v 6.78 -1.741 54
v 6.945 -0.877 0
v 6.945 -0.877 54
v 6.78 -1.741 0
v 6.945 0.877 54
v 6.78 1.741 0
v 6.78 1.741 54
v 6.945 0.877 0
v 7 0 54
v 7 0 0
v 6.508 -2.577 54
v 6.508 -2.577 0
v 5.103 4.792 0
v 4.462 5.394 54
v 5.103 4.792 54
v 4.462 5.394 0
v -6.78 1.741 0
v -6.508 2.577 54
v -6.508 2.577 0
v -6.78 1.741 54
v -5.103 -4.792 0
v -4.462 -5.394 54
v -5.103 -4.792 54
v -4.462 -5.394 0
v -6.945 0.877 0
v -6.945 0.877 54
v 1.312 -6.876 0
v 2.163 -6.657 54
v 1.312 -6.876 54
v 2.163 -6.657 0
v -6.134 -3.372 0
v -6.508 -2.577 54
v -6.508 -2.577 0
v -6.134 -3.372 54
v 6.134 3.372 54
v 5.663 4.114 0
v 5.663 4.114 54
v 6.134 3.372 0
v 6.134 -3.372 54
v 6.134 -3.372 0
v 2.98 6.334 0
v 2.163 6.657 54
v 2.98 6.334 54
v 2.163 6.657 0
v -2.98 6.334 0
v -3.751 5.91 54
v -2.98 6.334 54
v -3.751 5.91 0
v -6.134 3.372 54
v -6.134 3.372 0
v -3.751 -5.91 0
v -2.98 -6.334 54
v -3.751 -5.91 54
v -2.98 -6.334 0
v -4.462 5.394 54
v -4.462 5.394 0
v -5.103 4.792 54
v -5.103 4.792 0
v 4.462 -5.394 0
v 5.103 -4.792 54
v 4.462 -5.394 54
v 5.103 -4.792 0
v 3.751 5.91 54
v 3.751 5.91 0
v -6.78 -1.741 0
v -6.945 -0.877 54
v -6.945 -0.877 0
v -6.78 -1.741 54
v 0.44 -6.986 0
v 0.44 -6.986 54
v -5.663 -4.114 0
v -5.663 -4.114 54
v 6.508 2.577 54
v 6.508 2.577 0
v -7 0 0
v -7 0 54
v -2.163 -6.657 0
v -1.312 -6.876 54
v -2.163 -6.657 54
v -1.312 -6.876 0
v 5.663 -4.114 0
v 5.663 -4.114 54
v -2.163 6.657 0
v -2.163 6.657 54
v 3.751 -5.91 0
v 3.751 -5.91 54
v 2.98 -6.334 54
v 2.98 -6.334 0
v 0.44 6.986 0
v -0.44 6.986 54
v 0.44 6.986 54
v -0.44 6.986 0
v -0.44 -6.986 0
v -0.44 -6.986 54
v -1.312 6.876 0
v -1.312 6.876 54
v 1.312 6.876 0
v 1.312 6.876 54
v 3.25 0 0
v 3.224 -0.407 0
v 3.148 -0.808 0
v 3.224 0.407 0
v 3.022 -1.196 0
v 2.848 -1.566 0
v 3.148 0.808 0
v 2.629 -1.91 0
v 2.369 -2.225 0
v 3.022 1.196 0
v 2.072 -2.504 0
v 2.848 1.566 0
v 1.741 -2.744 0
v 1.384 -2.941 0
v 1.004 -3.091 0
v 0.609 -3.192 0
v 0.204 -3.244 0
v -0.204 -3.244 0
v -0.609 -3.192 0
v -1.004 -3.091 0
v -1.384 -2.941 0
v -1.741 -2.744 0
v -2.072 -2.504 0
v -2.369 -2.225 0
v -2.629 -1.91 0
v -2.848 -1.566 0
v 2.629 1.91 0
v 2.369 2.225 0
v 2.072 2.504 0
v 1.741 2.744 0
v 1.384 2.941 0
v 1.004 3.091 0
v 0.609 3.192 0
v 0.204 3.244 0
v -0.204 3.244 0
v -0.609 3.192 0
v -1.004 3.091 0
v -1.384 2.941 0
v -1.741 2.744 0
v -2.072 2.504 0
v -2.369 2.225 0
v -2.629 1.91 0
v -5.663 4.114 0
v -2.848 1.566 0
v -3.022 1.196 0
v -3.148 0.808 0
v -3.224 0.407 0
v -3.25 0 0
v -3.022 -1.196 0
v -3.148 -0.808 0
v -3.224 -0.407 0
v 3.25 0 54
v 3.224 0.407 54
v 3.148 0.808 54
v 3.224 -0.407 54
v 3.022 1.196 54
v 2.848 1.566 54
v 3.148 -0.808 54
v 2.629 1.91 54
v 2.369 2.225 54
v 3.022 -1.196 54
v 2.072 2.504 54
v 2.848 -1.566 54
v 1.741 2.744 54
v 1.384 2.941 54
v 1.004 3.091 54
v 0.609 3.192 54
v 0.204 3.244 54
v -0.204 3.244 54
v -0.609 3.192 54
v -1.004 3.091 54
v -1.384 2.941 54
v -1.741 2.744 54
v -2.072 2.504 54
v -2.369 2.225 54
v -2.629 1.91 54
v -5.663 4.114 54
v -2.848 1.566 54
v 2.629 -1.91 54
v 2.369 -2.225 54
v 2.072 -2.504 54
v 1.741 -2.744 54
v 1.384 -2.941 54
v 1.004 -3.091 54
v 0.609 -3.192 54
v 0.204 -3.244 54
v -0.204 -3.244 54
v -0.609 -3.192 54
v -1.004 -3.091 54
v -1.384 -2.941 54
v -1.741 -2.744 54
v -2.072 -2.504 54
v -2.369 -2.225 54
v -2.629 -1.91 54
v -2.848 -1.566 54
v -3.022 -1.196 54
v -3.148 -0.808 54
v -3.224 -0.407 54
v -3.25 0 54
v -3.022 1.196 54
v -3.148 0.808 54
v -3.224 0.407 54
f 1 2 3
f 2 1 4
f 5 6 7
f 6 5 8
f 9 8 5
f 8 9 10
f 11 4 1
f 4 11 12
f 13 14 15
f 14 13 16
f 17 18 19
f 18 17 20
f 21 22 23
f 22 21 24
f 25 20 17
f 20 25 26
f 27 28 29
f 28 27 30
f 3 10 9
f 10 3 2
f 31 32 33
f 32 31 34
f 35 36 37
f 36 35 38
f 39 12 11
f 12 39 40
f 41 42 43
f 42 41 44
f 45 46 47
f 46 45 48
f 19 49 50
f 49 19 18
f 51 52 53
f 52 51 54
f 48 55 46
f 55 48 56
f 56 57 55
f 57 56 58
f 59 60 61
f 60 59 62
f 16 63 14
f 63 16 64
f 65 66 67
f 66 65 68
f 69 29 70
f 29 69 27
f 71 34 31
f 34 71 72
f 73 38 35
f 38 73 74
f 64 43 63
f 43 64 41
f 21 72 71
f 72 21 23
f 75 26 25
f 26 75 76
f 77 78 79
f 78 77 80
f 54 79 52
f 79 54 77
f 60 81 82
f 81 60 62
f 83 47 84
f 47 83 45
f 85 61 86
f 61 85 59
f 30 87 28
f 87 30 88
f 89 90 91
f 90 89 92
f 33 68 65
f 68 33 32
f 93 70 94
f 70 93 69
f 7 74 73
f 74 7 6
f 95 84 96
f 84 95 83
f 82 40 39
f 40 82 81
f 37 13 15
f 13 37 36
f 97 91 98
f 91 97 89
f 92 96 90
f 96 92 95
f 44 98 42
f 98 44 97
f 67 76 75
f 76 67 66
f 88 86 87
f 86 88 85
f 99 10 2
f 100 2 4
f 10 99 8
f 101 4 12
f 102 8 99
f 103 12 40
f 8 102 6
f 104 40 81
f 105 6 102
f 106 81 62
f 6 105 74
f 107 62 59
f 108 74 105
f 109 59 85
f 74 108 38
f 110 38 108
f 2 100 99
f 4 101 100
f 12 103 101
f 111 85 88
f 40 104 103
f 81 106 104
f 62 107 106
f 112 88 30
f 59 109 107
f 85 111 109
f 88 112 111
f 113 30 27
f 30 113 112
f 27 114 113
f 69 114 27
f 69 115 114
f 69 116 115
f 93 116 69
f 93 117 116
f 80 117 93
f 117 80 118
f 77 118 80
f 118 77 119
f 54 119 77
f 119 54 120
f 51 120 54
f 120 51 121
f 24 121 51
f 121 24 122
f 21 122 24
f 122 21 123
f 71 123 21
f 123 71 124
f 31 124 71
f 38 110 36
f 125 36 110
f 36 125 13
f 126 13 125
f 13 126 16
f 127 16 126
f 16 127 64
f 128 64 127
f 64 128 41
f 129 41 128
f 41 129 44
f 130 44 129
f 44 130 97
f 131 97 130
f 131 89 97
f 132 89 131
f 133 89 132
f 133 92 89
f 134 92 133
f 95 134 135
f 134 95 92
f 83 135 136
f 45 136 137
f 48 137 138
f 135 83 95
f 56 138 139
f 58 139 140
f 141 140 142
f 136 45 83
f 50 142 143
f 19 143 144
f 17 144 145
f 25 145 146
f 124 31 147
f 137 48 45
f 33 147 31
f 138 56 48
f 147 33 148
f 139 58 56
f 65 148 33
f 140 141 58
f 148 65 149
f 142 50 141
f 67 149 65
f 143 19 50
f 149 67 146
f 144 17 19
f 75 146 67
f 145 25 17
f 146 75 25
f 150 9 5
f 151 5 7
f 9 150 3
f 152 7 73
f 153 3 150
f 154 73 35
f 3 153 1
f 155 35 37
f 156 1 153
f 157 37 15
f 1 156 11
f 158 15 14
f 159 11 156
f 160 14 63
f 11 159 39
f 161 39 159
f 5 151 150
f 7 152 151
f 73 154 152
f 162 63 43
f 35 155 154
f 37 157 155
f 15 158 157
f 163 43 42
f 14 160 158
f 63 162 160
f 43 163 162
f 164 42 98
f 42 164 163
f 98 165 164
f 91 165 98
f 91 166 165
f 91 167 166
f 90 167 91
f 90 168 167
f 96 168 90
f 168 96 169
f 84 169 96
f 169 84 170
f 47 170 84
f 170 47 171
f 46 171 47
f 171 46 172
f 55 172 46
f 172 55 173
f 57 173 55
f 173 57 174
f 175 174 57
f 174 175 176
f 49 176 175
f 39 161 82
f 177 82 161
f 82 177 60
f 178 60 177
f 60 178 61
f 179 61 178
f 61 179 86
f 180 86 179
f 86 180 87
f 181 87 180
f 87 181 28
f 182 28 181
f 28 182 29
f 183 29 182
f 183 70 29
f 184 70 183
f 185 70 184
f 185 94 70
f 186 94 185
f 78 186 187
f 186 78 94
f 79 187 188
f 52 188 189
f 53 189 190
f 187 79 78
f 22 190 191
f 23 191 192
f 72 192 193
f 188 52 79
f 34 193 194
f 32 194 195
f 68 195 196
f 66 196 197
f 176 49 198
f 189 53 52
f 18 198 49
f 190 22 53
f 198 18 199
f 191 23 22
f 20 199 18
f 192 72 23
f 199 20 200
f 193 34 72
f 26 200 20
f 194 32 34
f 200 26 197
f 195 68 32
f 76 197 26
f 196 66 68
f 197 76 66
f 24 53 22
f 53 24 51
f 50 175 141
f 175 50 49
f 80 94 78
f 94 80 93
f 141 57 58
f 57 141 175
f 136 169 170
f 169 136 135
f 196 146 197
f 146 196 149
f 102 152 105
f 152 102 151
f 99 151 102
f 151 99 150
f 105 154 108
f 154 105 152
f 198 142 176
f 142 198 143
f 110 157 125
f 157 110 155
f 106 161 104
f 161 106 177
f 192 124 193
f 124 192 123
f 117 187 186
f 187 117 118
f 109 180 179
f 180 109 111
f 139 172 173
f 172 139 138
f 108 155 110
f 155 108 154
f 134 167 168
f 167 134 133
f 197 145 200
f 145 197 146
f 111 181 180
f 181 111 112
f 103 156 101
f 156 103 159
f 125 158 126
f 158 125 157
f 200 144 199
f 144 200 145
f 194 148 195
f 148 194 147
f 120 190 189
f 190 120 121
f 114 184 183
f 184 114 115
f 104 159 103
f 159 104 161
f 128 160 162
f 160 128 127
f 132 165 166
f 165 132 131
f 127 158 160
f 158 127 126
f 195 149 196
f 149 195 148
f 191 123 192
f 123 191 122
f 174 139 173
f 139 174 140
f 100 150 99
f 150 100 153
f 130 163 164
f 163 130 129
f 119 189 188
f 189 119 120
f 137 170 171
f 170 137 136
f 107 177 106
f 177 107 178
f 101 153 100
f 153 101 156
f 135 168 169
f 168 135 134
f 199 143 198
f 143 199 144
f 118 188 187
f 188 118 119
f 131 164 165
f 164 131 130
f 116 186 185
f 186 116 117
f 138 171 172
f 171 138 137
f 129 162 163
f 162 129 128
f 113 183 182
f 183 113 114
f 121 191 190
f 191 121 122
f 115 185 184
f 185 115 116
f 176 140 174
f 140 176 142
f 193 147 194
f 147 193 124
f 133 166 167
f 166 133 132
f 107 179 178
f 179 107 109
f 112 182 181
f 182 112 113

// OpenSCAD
$fn = 50;


difference() {
	union() {
		cylinder(h = 54, r = 7.0000000000);
	}
	union() {
		translate(v = [0.0000000000, 0.0000000000, -100.0000000000]) {
			cylinder(h = 200, r = 3.2500000000);
		}
	}
}
